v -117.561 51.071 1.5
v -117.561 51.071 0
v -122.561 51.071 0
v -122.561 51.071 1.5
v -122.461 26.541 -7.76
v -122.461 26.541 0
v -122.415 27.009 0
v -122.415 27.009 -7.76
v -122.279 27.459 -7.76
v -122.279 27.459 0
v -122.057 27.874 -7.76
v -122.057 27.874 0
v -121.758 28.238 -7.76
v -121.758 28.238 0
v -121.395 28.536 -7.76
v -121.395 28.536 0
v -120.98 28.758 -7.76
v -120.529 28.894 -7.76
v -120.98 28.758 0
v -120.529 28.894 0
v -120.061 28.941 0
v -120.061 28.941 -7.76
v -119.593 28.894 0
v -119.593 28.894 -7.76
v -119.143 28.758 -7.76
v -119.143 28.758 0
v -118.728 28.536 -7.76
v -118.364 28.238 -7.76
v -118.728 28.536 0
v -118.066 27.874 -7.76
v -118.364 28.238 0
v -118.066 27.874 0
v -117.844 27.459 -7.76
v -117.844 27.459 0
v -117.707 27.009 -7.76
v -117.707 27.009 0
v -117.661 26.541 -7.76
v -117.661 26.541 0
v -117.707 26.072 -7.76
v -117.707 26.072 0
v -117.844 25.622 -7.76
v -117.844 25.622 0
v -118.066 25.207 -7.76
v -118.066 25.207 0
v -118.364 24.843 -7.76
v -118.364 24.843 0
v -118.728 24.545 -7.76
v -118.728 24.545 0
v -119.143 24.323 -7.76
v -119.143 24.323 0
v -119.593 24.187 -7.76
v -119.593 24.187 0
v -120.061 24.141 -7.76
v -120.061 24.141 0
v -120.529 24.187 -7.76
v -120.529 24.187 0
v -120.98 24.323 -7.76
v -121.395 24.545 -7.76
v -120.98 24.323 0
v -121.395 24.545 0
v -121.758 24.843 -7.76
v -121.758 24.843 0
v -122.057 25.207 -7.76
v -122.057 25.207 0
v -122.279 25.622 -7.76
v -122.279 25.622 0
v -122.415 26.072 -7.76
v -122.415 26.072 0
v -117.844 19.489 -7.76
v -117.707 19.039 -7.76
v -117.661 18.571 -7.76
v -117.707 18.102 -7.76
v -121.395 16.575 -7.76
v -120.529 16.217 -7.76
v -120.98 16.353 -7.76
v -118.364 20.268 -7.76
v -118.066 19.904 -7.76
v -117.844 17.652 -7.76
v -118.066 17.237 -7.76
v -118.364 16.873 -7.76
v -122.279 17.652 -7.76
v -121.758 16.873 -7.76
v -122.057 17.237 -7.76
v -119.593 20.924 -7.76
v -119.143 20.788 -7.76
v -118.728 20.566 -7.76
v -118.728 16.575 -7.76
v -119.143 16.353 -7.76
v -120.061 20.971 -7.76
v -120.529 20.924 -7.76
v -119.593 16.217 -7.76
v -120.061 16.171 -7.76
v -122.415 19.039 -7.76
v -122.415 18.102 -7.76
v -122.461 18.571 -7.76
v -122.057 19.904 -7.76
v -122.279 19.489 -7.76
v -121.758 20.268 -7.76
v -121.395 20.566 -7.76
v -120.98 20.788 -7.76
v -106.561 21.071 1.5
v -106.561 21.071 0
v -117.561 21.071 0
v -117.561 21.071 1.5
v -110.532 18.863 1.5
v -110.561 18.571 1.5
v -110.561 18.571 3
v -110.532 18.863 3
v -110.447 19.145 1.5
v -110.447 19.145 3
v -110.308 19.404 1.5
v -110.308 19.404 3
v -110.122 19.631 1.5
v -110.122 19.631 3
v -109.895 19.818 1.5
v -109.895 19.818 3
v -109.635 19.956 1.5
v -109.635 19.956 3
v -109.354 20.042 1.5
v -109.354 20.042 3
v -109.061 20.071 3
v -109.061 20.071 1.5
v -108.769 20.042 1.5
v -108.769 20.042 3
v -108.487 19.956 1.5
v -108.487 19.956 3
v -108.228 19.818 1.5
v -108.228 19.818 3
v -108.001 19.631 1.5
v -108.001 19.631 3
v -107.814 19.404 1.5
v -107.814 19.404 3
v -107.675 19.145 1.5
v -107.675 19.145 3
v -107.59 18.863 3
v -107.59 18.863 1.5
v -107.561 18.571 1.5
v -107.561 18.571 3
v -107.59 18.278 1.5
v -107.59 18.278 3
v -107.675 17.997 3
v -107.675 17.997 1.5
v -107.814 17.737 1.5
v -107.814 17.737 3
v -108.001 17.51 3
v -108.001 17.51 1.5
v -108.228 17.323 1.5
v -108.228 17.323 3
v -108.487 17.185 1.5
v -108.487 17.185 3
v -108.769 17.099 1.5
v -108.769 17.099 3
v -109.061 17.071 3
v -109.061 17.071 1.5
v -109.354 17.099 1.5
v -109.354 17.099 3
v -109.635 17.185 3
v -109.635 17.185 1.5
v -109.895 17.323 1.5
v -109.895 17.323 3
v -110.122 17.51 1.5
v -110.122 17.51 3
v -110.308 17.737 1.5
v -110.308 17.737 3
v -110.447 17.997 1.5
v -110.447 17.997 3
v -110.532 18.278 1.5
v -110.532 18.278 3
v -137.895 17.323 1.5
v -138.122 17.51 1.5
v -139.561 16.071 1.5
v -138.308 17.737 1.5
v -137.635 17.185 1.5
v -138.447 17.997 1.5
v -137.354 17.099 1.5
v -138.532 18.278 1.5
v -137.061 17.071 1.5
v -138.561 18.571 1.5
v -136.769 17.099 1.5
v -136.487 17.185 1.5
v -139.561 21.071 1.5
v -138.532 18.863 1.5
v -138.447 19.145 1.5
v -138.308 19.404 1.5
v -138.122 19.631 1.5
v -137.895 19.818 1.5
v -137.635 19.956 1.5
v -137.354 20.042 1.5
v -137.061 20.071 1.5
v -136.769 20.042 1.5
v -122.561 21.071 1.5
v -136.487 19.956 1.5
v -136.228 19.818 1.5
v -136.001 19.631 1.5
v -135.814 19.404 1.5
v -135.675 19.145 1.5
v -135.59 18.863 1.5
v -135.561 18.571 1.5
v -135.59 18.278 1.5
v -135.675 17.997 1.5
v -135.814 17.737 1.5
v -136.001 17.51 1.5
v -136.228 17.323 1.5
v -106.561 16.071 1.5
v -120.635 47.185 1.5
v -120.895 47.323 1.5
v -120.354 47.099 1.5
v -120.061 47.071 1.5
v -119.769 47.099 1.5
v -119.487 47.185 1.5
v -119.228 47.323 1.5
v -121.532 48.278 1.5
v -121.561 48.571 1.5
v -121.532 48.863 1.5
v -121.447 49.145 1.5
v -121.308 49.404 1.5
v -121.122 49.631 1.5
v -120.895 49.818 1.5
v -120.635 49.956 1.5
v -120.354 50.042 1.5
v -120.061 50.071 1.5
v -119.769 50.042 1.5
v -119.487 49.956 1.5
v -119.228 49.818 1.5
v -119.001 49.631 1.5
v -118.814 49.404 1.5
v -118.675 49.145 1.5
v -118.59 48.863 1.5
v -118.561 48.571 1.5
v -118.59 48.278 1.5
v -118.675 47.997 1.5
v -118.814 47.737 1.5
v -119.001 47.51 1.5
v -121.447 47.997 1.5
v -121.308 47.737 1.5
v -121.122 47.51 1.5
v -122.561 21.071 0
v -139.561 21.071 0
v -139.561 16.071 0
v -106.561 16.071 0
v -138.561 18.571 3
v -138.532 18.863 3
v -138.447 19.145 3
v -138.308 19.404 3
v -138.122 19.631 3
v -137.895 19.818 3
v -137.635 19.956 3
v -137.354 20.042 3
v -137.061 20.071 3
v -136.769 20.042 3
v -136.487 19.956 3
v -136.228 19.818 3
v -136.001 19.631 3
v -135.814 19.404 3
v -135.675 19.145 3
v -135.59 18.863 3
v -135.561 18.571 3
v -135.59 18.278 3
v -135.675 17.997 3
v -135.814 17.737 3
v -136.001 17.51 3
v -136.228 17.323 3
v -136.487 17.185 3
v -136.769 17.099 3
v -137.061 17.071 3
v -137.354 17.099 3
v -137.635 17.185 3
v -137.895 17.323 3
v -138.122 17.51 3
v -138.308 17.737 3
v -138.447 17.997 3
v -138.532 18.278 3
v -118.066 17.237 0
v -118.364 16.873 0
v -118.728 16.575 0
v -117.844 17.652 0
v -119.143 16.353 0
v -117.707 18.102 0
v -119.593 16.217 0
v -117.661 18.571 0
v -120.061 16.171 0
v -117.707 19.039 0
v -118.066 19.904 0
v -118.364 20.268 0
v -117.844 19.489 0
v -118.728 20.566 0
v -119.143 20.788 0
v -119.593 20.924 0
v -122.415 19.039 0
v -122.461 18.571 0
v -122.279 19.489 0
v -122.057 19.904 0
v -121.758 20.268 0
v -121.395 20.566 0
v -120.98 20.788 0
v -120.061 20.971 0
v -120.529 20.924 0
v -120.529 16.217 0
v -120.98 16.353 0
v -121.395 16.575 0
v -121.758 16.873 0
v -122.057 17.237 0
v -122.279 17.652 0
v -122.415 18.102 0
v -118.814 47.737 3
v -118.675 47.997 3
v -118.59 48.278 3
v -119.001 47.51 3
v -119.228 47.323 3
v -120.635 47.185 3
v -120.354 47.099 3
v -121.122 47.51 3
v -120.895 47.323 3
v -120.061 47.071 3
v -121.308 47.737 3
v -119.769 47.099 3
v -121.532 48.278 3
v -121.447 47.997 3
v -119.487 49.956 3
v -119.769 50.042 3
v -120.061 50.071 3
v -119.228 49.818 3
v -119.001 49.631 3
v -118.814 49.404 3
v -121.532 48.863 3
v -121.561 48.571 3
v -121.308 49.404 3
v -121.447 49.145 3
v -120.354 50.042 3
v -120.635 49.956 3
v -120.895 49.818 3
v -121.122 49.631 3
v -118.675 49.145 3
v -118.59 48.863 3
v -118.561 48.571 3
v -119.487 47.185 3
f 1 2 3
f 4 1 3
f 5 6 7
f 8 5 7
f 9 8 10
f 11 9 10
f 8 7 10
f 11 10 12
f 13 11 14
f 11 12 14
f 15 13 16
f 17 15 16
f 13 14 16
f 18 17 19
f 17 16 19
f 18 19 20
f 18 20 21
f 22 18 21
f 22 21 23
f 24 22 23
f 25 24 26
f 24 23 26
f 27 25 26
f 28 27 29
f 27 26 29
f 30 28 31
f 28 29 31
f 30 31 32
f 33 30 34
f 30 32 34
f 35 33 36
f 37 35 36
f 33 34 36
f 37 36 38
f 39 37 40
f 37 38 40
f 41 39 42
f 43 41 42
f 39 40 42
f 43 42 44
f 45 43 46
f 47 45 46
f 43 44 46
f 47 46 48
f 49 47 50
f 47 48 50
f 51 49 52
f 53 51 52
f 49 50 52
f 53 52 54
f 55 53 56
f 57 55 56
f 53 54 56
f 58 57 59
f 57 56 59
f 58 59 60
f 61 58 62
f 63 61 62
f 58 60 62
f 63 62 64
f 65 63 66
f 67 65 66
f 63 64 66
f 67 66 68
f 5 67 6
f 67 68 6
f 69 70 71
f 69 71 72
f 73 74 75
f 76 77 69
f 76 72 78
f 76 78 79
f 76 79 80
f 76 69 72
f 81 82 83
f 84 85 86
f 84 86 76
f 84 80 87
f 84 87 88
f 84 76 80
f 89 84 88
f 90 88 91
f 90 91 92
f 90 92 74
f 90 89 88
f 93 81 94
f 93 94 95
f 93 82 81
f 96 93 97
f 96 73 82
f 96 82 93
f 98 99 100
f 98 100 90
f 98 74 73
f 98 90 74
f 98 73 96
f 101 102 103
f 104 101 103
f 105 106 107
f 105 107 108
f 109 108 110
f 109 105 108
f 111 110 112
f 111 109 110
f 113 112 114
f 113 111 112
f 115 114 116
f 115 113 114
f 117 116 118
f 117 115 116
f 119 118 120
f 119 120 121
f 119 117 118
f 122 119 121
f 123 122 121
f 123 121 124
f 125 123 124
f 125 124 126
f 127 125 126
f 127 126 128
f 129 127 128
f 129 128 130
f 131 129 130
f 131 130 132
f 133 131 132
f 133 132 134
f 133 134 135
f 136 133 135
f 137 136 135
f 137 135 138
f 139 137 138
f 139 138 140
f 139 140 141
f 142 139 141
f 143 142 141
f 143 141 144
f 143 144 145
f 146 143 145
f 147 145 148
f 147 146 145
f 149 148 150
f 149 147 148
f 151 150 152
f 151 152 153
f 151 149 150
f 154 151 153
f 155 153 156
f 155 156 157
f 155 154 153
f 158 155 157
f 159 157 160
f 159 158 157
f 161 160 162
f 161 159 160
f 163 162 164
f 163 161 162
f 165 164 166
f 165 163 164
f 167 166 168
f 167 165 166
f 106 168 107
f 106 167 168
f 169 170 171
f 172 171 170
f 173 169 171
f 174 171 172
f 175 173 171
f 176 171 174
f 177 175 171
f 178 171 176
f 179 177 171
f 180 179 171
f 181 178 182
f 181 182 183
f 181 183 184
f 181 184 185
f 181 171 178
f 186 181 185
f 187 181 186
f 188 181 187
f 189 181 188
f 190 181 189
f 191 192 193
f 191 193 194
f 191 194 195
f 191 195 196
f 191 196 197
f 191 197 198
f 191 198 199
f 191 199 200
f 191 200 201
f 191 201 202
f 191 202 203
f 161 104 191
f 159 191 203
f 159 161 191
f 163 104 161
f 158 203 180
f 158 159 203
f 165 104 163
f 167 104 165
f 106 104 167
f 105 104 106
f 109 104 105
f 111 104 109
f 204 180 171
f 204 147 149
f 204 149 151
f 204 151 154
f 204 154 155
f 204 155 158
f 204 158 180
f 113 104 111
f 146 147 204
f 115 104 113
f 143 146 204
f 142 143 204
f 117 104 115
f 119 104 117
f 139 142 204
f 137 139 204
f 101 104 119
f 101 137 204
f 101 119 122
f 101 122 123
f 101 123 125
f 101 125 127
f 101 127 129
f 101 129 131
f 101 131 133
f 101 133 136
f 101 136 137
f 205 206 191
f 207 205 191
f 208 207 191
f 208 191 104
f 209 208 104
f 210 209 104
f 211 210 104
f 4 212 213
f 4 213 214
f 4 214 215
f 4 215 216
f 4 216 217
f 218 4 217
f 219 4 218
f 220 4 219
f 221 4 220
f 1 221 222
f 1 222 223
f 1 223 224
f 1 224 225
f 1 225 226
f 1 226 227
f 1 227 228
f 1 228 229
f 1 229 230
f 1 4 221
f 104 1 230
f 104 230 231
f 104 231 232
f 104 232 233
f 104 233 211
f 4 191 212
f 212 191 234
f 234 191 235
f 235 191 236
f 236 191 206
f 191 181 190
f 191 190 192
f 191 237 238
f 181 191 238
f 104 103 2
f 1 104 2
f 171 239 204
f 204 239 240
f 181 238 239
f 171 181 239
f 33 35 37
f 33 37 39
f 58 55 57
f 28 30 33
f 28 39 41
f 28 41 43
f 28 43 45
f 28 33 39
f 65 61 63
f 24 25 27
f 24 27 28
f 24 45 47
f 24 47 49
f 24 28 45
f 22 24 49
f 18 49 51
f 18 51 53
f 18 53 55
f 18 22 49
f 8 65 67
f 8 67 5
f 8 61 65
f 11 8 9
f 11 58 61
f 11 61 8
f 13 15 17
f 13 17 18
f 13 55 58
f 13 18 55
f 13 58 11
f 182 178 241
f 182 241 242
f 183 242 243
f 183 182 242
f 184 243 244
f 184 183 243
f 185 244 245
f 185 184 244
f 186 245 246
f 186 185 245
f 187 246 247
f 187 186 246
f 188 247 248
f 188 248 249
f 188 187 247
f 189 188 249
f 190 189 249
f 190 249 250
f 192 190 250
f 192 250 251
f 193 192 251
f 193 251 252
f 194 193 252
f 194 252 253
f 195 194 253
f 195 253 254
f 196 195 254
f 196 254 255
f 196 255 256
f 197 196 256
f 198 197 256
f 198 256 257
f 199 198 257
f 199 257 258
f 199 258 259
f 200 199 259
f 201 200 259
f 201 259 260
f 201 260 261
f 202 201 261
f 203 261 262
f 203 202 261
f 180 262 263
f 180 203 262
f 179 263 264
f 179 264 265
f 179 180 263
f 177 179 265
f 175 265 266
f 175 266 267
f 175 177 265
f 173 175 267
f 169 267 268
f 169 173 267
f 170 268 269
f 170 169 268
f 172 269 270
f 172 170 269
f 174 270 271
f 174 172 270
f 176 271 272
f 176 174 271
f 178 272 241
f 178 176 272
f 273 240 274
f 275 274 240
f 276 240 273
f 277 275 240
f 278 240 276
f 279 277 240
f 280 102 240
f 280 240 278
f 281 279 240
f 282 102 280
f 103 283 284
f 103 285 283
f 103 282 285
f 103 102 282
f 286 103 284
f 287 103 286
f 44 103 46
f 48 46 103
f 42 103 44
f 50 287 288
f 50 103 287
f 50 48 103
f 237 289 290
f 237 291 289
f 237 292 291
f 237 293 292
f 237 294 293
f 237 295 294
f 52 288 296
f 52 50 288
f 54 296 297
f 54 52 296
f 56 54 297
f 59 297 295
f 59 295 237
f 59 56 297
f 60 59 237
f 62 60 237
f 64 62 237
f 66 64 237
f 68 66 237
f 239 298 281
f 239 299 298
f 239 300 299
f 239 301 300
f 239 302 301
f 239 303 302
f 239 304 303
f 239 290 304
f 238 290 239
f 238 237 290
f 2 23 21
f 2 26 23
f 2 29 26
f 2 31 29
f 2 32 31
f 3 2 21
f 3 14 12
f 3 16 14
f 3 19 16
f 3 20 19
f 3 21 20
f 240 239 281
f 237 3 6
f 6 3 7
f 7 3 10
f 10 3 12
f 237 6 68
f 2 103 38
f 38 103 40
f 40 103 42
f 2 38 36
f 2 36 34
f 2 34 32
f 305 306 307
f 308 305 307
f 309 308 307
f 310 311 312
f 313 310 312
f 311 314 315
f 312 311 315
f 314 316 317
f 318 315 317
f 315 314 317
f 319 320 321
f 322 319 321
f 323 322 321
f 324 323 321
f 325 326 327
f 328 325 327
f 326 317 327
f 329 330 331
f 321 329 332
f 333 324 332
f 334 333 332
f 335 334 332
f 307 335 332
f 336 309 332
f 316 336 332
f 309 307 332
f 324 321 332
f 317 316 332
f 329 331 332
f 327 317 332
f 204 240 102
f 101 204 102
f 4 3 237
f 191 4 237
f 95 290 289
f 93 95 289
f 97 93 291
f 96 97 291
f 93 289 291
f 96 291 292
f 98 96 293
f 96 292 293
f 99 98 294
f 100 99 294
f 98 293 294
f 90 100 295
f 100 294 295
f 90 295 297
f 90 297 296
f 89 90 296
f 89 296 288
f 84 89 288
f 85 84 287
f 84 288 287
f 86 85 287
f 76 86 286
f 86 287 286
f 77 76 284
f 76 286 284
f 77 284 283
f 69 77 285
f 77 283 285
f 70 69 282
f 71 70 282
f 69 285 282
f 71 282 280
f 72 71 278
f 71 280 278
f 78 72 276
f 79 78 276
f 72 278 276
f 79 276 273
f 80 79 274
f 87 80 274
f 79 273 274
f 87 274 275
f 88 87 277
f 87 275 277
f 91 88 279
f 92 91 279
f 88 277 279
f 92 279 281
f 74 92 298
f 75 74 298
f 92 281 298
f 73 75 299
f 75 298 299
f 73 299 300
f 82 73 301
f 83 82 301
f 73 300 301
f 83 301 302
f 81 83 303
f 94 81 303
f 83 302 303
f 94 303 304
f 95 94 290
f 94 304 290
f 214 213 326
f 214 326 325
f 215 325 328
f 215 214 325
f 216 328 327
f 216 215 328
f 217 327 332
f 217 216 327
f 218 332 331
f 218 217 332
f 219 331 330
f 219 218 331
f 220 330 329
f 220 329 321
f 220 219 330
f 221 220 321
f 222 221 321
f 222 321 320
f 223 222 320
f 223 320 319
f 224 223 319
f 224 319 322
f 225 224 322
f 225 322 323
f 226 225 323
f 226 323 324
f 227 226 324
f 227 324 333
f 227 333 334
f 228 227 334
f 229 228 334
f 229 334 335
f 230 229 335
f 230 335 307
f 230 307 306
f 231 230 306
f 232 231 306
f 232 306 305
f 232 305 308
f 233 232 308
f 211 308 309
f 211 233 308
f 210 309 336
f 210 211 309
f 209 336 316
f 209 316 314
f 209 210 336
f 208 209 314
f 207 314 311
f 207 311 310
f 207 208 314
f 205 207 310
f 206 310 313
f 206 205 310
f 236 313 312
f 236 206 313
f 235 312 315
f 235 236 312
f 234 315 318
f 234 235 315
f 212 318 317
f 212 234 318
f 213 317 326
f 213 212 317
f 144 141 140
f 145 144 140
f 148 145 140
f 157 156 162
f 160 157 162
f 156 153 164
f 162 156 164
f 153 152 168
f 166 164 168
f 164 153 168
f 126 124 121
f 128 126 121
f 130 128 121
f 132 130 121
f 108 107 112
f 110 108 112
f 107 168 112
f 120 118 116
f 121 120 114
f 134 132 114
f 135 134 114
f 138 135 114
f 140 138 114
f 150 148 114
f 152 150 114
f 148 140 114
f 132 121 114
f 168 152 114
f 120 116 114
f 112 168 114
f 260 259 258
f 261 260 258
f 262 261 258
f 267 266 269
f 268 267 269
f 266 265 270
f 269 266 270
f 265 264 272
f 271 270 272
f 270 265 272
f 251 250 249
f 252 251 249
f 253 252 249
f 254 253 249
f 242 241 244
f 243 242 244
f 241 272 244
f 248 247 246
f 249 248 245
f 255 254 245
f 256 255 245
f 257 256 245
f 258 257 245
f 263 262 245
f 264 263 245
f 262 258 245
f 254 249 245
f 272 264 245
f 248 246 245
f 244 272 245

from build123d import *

# Parameters (mm, degrees)
BOSS_EXTRUDE2_DEPTH = 1.5
SKETCH5_R           = 1.5
BOSS_EXTRUDE5_DEPTH = 3
SKETCH6_R           = 2.4
BOSS_EXTRUDE6_DEPTH = 7.76


with BuildPart() as part:
    # Sketch4 → Boss-Extrude2 (new body)
    with BuildSketch(Plane.XY):
        Polygon((-139.561248012, 16.070535031), (-106.561248012, 16.070535031), (-106.561248012, 21.070535031), (-117.561248012, 21.070535031), (-117.561248012, 51.070535031), (-122.561248012, 51.070535031), (-122.561248012, 21.070535031), (-139.561248012, 21.070535031), align=None)
    extrude(amount=BOSS_EXTRUDE2_DEPTH)

    # Sketch5 → Boss-Extrude5 (add)
    with BuildSketch(Plane(origin=(0, 0, 0), x_dir=(-1, 0, 0), z_dir=(0, 0, -1))):
        with Locations((137.061248012, 18.570535031)):
            Circle(SKETCH5_R)
        with Locations((109.061248012, 18.570535031)):
            Circle(SKETCH5_R)
        with Locations((120.061248012, 48.570535031)):
            Circle(SKETCH5_R)
    extrude(amount=-BOSS_EXTRUDE5_DEPTH)

    # Sketch6 → Boss-Extrude6 (add)
    with BuildSketch(Plane(origin=(0, 0, 0), x_dir=(-1, 0, 0), z_dir=(0, 0, -1))):
        with Locations((120.061248012, 18.570535031)):
            Circle(SKETCH6_R)
        with Locations((120.061248012, 26.540535031)):
            Circle(SKETCH6_R)
    extrude(amount=BOSS_EXTRUDE6_DEPTH)


solid = part.part
